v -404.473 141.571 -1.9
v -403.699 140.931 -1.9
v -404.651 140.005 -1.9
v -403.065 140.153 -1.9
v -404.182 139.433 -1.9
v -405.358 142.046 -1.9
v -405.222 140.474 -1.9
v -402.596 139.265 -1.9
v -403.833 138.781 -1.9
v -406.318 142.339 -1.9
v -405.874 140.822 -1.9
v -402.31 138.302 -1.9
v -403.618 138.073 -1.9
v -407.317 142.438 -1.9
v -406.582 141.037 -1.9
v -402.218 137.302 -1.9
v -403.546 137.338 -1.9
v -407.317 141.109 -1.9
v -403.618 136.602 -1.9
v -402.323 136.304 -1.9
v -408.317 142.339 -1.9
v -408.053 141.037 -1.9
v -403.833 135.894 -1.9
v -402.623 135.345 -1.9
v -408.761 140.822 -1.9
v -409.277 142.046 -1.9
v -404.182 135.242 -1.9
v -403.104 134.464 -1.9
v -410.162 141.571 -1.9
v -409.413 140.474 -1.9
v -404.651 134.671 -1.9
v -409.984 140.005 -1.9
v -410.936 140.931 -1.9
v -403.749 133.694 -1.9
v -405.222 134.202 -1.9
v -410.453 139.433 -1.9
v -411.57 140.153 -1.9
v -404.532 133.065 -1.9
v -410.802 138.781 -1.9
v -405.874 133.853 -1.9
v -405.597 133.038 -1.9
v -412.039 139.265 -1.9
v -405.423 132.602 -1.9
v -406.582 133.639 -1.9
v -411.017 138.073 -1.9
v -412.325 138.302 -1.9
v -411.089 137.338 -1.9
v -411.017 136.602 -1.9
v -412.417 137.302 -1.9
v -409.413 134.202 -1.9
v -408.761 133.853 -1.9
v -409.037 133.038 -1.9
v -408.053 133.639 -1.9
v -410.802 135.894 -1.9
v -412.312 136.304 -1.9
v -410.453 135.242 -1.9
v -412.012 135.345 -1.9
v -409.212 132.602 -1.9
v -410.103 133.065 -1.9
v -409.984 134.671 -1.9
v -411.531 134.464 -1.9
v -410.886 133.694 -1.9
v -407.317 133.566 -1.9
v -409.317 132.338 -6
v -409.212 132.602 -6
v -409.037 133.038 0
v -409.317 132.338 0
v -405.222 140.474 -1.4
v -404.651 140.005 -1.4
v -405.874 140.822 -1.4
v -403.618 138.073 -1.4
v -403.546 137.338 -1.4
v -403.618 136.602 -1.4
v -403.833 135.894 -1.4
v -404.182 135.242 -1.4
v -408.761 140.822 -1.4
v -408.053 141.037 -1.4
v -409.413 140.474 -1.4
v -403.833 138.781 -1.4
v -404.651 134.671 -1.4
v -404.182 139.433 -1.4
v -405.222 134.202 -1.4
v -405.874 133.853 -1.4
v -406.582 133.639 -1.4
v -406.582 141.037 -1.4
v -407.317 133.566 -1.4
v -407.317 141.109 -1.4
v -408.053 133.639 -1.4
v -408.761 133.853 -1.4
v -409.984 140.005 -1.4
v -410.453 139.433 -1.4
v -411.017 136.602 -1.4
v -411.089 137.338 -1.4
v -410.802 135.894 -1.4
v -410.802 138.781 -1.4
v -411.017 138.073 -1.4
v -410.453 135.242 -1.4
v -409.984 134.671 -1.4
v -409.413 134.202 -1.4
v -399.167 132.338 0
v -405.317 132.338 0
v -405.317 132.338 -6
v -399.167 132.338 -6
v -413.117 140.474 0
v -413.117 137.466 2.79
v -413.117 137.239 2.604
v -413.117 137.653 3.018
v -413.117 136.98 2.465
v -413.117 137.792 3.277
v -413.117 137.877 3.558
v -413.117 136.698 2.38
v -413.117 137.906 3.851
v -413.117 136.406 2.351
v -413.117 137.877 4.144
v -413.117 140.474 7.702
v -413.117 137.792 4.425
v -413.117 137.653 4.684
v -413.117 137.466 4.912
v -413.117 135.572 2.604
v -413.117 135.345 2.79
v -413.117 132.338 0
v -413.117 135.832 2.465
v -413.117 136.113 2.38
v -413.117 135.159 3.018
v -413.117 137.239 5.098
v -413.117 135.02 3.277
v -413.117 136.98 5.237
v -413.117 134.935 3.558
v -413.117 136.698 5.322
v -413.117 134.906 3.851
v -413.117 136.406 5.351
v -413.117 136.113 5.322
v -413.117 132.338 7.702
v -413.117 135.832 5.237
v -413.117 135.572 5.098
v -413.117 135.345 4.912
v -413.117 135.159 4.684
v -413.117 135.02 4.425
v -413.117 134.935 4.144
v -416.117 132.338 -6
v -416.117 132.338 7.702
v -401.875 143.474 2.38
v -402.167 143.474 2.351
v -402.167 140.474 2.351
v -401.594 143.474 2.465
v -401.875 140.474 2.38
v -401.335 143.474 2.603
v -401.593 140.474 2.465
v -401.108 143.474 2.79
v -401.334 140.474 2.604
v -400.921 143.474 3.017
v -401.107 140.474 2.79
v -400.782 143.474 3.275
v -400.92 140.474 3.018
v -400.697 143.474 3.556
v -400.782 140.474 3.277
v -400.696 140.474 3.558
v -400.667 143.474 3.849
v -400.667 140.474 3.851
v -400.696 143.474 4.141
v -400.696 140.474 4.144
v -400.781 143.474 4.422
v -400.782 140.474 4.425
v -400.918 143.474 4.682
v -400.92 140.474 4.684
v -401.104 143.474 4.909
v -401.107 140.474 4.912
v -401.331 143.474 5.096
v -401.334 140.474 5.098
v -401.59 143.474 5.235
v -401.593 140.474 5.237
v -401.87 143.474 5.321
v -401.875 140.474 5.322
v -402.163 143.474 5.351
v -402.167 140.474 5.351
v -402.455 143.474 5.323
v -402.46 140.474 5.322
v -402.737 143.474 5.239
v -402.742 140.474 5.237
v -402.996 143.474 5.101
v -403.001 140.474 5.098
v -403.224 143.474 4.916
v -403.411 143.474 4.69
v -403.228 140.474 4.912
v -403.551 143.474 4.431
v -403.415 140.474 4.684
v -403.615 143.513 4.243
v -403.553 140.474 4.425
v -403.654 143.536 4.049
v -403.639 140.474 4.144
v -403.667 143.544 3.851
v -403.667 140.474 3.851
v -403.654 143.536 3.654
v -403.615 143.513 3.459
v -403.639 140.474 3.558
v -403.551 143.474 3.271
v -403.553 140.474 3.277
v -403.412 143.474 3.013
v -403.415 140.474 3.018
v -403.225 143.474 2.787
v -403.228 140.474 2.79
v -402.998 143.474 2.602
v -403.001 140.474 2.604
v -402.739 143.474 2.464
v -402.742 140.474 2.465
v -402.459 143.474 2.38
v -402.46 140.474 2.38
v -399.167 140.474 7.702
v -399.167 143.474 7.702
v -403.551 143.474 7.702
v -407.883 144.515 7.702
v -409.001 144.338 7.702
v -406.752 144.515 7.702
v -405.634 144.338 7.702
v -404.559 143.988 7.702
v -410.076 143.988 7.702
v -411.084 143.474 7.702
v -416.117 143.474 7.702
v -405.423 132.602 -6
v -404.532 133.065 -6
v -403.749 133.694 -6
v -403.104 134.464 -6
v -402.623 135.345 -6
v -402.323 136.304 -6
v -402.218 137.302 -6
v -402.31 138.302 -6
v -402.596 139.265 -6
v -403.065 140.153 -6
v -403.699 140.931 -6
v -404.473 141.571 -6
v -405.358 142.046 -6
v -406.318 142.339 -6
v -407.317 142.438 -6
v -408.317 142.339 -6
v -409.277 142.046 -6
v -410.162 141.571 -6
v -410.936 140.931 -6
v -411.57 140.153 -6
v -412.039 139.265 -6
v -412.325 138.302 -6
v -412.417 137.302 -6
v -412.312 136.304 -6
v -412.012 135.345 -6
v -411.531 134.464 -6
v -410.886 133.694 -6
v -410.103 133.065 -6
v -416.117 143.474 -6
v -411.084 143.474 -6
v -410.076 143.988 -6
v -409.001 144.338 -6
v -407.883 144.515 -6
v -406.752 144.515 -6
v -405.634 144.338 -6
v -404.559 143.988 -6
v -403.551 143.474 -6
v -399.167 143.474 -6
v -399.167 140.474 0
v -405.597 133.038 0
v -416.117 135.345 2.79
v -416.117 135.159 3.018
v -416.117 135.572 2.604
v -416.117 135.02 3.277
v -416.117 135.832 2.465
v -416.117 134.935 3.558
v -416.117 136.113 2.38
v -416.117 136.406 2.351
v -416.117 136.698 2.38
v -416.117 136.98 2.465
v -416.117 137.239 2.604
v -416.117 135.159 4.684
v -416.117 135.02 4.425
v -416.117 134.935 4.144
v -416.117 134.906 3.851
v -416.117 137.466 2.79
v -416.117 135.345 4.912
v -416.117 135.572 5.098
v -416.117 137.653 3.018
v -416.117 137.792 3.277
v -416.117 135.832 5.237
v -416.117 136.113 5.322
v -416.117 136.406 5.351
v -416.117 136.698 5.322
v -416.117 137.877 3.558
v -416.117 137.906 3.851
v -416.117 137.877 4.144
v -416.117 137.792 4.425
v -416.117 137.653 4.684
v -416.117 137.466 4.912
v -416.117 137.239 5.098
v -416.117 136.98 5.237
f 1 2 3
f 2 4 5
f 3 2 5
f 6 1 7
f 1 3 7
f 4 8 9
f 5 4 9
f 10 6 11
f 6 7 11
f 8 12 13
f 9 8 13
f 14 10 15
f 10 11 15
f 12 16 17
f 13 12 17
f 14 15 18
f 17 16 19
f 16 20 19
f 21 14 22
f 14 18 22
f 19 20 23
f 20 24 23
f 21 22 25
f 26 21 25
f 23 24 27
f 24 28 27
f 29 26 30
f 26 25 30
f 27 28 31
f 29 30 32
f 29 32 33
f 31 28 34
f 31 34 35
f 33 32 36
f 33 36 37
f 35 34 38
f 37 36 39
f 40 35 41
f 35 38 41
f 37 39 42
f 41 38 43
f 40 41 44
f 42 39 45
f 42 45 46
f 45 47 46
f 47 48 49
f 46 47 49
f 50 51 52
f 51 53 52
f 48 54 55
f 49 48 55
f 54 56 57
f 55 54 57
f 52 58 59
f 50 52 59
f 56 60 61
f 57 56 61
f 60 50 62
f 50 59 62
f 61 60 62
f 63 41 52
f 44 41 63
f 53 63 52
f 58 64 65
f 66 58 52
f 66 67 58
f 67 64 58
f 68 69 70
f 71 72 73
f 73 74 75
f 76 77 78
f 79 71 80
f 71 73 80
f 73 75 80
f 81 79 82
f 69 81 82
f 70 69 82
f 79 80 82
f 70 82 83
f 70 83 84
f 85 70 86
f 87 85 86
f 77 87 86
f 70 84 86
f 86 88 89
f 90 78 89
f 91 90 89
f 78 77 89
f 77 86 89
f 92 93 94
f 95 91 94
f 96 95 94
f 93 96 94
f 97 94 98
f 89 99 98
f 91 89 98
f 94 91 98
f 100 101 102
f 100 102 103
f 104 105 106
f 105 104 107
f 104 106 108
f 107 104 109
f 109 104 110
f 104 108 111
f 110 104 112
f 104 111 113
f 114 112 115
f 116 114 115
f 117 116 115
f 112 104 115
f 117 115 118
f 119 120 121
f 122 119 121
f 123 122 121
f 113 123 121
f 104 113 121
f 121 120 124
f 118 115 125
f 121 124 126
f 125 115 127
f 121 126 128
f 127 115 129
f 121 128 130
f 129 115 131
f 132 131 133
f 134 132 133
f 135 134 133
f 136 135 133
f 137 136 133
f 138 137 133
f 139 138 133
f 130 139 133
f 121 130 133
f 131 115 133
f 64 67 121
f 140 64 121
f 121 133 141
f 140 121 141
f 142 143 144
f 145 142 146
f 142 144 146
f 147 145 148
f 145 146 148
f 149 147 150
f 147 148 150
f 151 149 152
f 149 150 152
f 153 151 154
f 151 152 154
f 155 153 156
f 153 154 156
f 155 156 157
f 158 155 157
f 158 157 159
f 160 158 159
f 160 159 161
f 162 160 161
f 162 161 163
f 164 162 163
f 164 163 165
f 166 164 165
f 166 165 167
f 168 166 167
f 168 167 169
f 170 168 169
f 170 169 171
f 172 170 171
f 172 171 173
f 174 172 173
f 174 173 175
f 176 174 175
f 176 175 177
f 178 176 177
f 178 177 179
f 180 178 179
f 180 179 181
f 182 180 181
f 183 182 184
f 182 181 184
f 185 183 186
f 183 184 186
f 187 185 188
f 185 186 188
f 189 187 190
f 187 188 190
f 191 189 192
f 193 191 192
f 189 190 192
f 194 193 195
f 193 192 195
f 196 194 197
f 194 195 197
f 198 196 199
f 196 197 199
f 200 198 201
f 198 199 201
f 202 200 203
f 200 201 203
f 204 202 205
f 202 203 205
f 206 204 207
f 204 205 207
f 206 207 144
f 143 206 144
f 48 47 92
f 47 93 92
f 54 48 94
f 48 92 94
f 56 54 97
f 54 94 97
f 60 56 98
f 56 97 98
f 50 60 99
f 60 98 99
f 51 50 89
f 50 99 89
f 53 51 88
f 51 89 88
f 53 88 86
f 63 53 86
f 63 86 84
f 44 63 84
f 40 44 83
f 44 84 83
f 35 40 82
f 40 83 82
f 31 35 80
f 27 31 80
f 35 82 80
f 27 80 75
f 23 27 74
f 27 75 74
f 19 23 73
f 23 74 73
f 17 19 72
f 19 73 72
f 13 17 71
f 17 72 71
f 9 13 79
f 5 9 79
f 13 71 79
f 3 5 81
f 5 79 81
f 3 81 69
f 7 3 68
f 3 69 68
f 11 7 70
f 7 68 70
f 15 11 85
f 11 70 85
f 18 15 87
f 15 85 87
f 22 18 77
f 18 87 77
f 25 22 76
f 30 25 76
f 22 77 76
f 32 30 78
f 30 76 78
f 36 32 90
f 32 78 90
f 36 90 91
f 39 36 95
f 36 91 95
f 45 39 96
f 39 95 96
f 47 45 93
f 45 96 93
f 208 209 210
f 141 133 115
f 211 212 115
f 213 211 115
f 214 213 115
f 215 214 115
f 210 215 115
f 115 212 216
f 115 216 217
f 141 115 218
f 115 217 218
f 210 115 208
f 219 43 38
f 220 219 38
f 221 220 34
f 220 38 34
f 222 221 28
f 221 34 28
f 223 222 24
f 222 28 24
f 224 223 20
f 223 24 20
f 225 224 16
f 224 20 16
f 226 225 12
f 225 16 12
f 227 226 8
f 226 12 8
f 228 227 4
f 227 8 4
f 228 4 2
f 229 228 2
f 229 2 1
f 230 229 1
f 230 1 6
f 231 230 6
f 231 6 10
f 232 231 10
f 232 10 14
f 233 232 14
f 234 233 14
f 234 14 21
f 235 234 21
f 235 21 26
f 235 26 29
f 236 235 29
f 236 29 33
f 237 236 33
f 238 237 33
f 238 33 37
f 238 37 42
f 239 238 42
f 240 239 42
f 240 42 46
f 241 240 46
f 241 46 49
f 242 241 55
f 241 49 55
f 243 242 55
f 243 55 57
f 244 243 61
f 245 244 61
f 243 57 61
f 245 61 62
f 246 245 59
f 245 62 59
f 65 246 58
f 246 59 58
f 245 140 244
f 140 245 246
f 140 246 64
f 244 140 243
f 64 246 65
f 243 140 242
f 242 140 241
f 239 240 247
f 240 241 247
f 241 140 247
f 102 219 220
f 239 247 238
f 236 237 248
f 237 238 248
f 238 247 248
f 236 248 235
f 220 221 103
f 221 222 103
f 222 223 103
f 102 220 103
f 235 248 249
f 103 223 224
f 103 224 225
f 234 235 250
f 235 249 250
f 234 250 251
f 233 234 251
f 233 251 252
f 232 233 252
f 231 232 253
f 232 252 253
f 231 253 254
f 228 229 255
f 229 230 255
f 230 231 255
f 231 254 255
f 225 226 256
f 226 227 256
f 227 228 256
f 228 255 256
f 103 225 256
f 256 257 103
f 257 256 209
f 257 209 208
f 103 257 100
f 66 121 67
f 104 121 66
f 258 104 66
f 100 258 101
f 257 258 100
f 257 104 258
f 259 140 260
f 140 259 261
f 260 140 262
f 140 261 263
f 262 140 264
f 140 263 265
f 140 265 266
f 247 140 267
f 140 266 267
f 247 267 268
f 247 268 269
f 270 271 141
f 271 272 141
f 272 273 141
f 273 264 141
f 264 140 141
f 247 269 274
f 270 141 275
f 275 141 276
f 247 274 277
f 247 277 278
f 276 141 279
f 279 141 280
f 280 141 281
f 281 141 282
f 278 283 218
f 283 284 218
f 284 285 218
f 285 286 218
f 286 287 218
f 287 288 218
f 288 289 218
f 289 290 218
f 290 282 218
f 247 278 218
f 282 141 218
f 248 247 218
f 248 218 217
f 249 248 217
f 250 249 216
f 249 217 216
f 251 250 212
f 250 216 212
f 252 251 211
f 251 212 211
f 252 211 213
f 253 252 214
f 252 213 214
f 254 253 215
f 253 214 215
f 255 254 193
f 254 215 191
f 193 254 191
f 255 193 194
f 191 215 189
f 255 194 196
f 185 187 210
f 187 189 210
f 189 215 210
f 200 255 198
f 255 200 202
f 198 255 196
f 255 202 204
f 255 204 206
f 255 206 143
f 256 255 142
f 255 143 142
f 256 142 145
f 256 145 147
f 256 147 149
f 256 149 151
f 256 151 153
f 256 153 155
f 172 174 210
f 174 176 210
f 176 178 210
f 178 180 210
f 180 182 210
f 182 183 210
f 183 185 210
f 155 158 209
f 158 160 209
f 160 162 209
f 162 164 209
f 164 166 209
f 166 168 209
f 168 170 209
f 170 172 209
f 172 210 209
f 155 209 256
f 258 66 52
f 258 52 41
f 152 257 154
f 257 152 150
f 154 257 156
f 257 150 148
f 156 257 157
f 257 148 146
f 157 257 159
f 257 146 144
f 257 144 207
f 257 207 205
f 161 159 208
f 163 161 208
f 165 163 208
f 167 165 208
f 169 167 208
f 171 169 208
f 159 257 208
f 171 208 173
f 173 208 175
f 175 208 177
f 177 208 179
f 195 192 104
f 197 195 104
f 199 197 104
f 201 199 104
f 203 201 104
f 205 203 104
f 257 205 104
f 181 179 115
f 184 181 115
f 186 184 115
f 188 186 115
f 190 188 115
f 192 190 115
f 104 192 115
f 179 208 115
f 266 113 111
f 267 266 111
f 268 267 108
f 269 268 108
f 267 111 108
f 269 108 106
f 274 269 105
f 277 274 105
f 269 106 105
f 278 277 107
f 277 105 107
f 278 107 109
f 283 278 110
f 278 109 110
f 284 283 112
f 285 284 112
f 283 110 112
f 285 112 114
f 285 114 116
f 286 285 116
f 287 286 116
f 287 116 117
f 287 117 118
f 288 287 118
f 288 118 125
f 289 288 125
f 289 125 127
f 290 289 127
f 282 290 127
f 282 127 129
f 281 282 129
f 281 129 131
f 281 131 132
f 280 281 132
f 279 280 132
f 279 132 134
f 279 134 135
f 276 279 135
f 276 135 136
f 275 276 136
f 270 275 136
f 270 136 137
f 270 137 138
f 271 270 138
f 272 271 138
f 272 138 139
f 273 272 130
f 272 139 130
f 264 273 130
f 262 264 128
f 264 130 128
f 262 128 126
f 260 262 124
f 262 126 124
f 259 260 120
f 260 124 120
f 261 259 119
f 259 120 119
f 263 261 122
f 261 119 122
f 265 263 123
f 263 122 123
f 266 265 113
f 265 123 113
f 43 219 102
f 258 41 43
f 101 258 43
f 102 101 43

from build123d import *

# Parameters (mm, degrees)
EXTRUDE_1_DEPTH     = 6
EXTRUDE_START       = 7.702227827
EXTRUDE_2_DEPTH     = 7.702227827
SKETCH_4_R          = 1.5
CUT_EXTRUDE_1_DEPTH = 6
SKETCH_5_R          = 1.5
CUT_EXTRUDE_2_DEPTH = 6


with BuildPart() as part:
    # Эскиз1 → Бобышка-Вытянуть1 (new body)
    with BuildSketch(Plane.XY):
        with BuildLine():
            Line((-416.117492961, 132.337705363), (-409.317492962, 132.337705363))
            Line((-409.317492962, 132.337705363), (-409.037492962, 133.037705363))
            Line((-409.037492962, 133.037705363), (-405.597492962, 133.037705363))
            Line((-405.597492962, 133.037705363), (-405.317492962, 132.337705363))
            Line((-405.317492962, 132.337705363), (-399.167492961, 132.337705363))
            Line((-399.167492961, 132.337705363), (-399.167492961, 143.47382058))
            Line((-399.167492961, 143.47382058), (-403.550784843, 143.47382058))
            ThreePointArc((-403.550784843, 143.47382058), (-407.317492962, 144.537705363), (-411.08420108, 143.47382058))
            Line((-411.08420108, 143.47382058), (-416.117492961, 143.47382058))
            Line((-416.117492961, 143.47382058), (-416.117492961, 132.337705363))
        make_face()
    extrude(amount=-EXTRUDE_1_DEPTH)

    # Эскиз2 → Вырез-Повернуть1 (revolve, cut)
    with BuildSketch(Plane(origin=(-407.317492962, 0, 0), x_dir=(0, 0, -1), z_dir=(1, 0, 0)), mode=Mode.PRIVATE) as cut_revolve_1_sk:
        Polygon((6.135092005, 142.437705363), (1.9, 142.437705363), (1.9, 141.109187411), (1.4, 141.109187411), (1.4, 137.337705363), (6.135092005, 137.337705363), align=None)
    revolve(cut_revolve_1_sk.sketch.rotate(Axis((-407.317492962, 137.337705363, -4.1), (0, 0, 1)), 90), axis=Axis((-407.317492962, 137.337705363, -4.1), (0, 0, 1)), mode=Mode.SUBTRACT)

    # Эскиз3 → Бобышка-Вытянуть2 (add)
    with BuildSketch(Plane.XY.offset(EXTRUDE_START)):
        with BuildLine():
            Line((-413.117492961, 140.47382058), (-413.117492961, 132.337705363))
            Line((-413.117492961, 132.337705363), (-416.117492961, 132.337705363))
            Line((-416.117492961, 132.337705363), (-416.117492961, 143.47382058))
            Line((-416.117492961, 143.47382058), (-411.08420108, 143.47382058))
            ThreePointArc((-411.08420108, 143.47382058), (-407.317492962, 144.537705363), (-403.550784843, 143.47382058))
            Line((-403.550784843, 143.47382058), (-399.167492961, 143.47382058))
            Line((-399.167492961, 143.47382058), (-399.167492961, 140.47382058))
            Line((-399.167492961, 140.47382058), (-413.117492961, 140.47382058))
        make_face()
    extrude(amount=-EXTRUDE_2_DEPTH)

    # Эскиз4 → Вырез-Вытянуть1 (cut)
    with BuildSketch(Plane(origin=(-413.117492961, 0, 0), x_dir=(0, 0, -1), z_dir=(1, 0, 0))):
        with Locations((-3.851113914, 136.405762972)):
            Circle(SKETCH_4_R)
    extrude(amount=-CUT_EXTRUDE_1_DEPTH, mode=Mode.SUBTRACT)

    # Эскиз5 → Вырез-Вытянуть2 (cut)
    with BuildSketch(Plane.XZ.offset(-140.47382058)):
        with Locations(Location((-402.167492961, 3.851113914, 0), (0, 0, 270))):
            Circle(SKETCH_5_R)
    extrude(amount=-CUT_EXTRUDE_2_DEPTH, mode=Mode.SUBTRACT)


solid = part.part
